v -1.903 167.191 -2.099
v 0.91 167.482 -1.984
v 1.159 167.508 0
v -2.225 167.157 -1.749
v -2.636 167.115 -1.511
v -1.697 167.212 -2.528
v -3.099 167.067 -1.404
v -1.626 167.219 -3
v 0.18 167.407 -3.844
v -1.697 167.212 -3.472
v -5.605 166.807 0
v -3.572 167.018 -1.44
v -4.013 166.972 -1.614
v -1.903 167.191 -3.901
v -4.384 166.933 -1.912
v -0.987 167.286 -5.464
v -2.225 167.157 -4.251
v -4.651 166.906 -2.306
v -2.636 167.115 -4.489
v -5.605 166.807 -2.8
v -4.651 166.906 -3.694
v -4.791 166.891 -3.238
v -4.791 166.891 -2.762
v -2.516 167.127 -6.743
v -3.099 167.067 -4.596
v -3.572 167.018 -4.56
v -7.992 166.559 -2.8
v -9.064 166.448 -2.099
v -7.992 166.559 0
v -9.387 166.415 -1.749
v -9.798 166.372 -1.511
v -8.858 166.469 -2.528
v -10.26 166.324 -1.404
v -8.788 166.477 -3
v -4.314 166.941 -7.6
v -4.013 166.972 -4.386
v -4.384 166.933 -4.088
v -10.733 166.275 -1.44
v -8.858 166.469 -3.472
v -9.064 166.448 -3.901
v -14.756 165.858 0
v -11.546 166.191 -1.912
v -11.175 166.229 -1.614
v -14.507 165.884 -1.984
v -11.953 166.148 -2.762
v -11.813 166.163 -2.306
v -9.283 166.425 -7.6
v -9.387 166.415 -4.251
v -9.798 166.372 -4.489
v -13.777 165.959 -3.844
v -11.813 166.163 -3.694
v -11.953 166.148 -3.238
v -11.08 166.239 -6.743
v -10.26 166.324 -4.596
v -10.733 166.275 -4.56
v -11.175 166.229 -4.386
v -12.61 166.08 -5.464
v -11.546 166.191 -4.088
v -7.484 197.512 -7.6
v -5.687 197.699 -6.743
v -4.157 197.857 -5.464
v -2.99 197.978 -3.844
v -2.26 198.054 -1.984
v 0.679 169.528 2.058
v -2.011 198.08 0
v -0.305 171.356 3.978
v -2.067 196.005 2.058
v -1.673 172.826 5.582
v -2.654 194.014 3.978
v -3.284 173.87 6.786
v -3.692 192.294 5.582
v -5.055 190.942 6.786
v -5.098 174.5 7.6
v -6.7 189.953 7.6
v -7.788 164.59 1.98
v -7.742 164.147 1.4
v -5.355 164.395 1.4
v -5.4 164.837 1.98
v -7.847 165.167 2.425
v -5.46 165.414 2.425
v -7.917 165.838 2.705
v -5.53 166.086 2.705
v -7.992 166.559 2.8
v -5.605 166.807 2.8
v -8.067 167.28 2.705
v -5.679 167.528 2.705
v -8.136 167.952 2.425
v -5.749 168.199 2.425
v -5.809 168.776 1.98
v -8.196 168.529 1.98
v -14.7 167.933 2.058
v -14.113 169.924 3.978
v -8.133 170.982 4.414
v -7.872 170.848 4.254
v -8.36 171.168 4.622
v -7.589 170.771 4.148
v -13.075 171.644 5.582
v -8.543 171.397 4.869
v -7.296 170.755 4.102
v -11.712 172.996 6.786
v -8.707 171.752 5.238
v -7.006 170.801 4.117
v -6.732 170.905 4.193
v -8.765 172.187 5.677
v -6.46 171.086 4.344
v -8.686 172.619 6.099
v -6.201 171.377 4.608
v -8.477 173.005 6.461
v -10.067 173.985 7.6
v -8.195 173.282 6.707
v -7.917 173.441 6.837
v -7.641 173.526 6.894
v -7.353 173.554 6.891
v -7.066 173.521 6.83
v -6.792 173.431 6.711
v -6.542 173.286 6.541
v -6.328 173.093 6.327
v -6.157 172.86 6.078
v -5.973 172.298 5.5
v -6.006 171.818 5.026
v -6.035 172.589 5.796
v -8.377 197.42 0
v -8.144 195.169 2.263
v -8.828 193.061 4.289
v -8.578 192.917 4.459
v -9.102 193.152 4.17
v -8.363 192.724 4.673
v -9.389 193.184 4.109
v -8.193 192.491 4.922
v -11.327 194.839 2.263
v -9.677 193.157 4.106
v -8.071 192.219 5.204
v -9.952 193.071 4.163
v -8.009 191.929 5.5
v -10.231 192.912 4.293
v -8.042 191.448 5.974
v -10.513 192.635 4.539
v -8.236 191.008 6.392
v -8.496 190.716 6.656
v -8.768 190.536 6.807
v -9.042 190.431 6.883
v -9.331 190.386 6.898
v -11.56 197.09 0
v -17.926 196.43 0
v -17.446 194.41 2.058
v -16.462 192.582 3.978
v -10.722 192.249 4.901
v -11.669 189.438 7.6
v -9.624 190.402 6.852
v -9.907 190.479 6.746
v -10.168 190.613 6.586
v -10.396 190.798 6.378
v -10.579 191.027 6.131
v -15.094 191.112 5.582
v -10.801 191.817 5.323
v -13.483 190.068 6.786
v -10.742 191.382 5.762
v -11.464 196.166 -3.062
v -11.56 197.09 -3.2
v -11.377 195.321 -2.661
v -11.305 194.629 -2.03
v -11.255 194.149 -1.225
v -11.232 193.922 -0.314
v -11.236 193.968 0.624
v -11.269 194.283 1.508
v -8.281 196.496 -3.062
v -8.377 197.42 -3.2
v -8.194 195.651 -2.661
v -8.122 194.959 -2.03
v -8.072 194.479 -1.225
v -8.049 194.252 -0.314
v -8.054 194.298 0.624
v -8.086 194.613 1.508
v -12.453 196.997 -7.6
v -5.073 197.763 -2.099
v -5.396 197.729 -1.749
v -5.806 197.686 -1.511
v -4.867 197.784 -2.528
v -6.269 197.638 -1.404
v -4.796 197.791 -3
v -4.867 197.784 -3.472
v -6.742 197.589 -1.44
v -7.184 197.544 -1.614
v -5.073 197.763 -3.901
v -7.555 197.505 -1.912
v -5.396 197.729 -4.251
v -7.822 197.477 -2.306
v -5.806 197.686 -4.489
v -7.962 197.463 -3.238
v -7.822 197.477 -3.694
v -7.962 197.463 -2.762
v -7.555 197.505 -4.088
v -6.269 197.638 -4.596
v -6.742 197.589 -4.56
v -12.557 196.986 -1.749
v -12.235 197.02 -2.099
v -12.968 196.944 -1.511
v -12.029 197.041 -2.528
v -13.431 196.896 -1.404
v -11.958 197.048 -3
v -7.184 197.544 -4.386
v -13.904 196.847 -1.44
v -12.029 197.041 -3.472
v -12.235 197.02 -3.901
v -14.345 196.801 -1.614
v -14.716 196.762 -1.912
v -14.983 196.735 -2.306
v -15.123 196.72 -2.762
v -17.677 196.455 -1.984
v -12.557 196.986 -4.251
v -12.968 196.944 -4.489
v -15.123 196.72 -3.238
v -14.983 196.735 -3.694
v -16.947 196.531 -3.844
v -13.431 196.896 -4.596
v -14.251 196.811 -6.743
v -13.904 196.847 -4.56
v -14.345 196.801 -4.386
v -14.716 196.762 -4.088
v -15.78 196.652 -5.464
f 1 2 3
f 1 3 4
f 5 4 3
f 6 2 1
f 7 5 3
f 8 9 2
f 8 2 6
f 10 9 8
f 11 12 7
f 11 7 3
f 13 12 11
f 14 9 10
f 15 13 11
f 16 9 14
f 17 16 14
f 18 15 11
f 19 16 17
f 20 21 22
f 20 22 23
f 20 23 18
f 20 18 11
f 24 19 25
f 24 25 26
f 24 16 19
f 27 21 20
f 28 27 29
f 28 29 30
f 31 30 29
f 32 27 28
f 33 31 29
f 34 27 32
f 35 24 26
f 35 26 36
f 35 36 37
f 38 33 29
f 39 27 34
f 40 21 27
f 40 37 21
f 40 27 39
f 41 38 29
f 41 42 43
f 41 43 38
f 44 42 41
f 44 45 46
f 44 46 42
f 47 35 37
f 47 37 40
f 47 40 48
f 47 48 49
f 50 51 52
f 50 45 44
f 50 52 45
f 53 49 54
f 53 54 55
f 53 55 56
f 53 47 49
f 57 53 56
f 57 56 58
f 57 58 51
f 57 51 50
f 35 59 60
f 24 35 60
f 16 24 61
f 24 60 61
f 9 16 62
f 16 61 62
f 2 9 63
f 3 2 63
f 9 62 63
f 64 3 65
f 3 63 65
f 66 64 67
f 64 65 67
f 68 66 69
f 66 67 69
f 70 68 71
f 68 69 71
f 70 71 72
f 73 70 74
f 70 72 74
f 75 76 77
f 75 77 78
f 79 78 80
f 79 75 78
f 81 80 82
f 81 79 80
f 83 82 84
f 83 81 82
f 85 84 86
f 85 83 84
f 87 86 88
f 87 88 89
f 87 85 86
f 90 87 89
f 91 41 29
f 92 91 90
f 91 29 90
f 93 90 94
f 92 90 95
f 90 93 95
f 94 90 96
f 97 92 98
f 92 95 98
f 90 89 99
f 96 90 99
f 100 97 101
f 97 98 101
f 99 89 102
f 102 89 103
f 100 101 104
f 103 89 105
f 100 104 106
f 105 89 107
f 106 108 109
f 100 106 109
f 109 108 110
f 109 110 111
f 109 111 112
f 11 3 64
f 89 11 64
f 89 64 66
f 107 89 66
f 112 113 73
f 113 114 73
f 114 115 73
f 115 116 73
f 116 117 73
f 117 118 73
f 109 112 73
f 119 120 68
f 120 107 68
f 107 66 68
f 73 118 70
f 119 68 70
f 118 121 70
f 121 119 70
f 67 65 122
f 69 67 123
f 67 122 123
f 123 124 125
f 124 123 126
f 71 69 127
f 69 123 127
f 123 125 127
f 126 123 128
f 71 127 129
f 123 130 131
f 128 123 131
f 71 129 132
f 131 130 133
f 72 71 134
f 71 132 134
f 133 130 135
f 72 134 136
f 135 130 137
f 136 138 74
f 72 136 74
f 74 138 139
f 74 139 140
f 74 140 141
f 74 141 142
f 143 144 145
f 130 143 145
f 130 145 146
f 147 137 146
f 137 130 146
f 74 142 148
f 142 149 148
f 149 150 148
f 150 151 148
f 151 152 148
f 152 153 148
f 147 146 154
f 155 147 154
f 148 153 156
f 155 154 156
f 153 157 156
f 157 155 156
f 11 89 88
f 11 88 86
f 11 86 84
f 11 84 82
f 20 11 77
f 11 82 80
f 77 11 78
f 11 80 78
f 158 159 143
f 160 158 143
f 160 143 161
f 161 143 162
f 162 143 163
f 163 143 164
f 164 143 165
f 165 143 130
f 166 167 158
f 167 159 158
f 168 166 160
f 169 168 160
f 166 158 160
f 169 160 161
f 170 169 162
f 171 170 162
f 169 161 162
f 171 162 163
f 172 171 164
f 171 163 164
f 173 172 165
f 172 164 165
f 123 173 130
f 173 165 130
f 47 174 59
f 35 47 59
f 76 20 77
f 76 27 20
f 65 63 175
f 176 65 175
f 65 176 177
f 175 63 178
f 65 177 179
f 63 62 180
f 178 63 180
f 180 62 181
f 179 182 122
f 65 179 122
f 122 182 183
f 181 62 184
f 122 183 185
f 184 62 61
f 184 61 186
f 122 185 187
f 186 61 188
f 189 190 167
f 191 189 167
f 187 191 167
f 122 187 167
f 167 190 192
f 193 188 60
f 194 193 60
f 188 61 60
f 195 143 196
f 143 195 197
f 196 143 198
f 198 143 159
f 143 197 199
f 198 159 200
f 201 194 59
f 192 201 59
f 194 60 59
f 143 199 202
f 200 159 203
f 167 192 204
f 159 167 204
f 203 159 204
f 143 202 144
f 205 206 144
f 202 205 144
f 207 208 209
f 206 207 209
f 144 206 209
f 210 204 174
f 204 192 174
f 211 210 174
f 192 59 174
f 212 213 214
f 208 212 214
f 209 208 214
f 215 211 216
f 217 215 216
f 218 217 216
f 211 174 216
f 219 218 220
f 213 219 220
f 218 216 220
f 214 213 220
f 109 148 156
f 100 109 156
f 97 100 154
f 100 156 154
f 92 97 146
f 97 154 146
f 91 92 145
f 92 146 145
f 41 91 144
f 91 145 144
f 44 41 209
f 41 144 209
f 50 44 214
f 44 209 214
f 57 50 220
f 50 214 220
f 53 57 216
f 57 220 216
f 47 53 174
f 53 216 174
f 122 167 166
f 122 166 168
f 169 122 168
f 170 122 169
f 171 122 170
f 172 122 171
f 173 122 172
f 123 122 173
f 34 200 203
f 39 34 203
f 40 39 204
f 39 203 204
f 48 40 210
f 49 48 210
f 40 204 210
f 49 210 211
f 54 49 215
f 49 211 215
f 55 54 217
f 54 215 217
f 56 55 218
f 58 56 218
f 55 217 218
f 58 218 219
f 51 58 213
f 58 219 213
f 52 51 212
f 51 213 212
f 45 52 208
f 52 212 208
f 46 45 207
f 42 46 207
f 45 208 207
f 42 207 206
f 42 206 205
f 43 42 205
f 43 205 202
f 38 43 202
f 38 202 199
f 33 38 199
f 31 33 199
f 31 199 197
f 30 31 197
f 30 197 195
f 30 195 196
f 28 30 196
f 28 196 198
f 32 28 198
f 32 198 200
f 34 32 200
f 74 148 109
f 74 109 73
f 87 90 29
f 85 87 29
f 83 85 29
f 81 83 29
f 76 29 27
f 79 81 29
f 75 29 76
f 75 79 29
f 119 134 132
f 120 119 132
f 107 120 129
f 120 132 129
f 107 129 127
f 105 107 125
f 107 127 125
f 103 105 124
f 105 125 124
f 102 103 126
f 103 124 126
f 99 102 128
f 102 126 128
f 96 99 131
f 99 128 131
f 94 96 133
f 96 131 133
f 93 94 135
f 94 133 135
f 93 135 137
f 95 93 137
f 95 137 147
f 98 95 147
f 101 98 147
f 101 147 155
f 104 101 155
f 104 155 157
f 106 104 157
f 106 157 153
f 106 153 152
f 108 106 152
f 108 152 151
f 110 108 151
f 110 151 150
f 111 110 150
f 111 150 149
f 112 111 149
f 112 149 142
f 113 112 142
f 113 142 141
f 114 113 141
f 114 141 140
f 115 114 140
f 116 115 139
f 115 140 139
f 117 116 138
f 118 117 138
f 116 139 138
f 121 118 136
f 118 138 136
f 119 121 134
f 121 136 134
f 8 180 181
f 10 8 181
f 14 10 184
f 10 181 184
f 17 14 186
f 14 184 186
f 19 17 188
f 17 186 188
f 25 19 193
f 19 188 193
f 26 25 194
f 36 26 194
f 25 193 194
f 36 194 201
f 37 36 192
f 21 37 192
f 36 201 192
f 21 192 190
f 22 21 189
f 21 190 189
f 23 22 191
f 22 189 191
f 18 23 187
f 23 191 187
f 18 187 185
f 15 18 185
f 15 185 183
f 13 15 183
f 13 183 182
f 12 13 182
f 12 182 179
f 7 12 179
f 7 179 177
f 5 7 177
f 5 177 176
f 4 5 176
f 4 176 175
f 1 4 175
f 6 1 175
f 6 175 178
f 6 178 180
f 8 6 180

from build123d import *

# Parameters (mm, degrees)
SKETCH3_R               = 8
BOSS_EXTRUDE1_DEPTH     = 30.735789474
CUT_EXTRUDE1_DEPTH      = 12.15350101
CUT_EXTRUDE1_DEPTH_BACK = 12.15350101
BOSS_EXTRUDE2_DEPTH     = 1.2
CUT_EXTRUDE2_DEPTH      = 1.6
SKETCH8_R               = 1.4
SKETCH8_R_2             = 1.6
CUT_EXTRUDE3_DEPTH      = 2.64160469
CUT_EXTRUDE3_DEPTH_BACK = 35.078782599
CUT_EXTRUDE4_DEPTH      = 35.078782599


with BuildPart() as part:
    # Sketch3 → Boss-Extrude1 (new body)
    with BuildSketch(Plane(origin=(-20.344467381, 196.178792599, 0), x_dir=(-0.994665758, -0.103150523, 0), z_dir=(0.103150523, -0.994665758, 0))):
        with Locations((-10.431405186, 0)):
            Circle(SKETCH3_R)
    extrude(amount=BOSS_EXTRUDE1_DEPTH)

    # Sketch4 → Cut-Extrude1 (cut, two sides)
    with BuildSketch(Plane(origin=(10.375761543, 1.076004901, 0), x_dir=(0.103150523, -0.994665758, 0), z_dir=(-0.994665758, -0.103150523, 0))) as cut_extrude1_sk:
        Polygon((-197.230869842, 0), (-189.230869842, 8), (-197.230869842, 8), align=None)
        Polygon((-174.495080368, 8), (-166.495080368, 8), (-166.495080368, 0), align=None)
    extrude(amount=CUT_EXTRUDE1_DEPTH, mode=Mode.SUBTRACT)
    extrude(cut_extrude1_sk.sketch, amount=-CUT_EXTRUDE1_DEPTH_BACK, mode=Mode.SUBTRACT)

    # Sketch5 → Boss-Extrude2 (add, symmetric)
    with BuildSketch(Plane(origin=(10.375761543, 1.076004901, 0), x_dir=(0.103150523, -0.994665758, 0), z_dir=(-0.994665758, -0.103150523, 0))):
        with BuildLine():
            Line((-166.495080368, -2.8), (-164.070209238, 1.4))
            ThreePointArc((-164.070209238, 1.4), (-166.12960703, 2.776045612), (-168.474979356, 1.979898987))
            Line((-168.474979356, 1.979898987), (-166.495080368, 0))
            Line((-166.495080368, 0), (-166.495080368, -2.8))
        make_face()
    extrude(amount=BOSS_EXTRUDE2_DEPTH, both=True)

    # Sketch7 → Cut-Extrude2 (cut, symmetric)
    with BuildSketch(Plane(origin=(10.375761543, 1.076004901, 0), x_dir=(0.103150523, -0.994665758, 0), z_dir=(-0.994665758, -0.103150523, 0))):
        with BuildLine():
            Line((-194.968128142, 2.2627417), (-197.230869842, 0))
            Line((-197.230869842, 0), (-197.230869842, -3.2))
            ThreePointArc((-197.230869842, -3.2), (-194.274455338, -1.224586984), (-194.968128142, 2.2627417))
        make_face()
    extrude(amount=CUT_EXTRUDE2_DEPTH, both=True, mode=Mode.SUBTRACT)

    # Sketch8 → Cut-Extrude3 (cut, two sides)
    with BuildSketch(Plane(origin=(-20.344467381, 196.178792599, 0), x_dir=(0.994665758, 0.103150523, 0), z_dir=(-0.103150523, 0.994665758, 0))) as cut_extrude3_sk:
        with Locations((10.431405186, -5.5)):
            Circle(SKETCH8_R)
        with Locations((6.831405186, 3)):
            Circle(SKETCH8_R_2)
        with Locations((14.031405186, 3)):
            Circle(SKETCH8_R_2)
    extrude(amount=CUT_EXTRUDE3_DEPTH, mode=Mode.SUBTRACT)
    extrude(cut_extrude3_sk.sketch, amount=-CUT_EXTRUDE3_DEPTH_BACK, mode=Mode.SUBTRACT)

    # Sketch9 → Cut-Extrude4 (cut, through all)
    with BuildSketch(Plane(origin=(-20.344467381, 196.178792599, 0), x_dir=(0.994665758, 0.103150523, 0), z_dir=(-0.103150523, 0.994665758, 0))):
        with BuildLine():
            Line((7.933405986, 7.6), (12.929404385, 7.6))
            ThreePointArc((12.929404385, 7.6), (10.431405186, 8), (7.933405986, 7.6))
        make_face()
        with BuildLine():
            Line((7.933405986, -7.6), (12.929404385, -7.6))
            ThreePointArc((12.929404385, -7.6), (10.431405186, -8), (7.933405986, -7.6))
        make_face()
    extrude(amount=-CUT_EXTRUDE4_DEPTH, mode=Mode.SUBTRACT)


solid = part.part
